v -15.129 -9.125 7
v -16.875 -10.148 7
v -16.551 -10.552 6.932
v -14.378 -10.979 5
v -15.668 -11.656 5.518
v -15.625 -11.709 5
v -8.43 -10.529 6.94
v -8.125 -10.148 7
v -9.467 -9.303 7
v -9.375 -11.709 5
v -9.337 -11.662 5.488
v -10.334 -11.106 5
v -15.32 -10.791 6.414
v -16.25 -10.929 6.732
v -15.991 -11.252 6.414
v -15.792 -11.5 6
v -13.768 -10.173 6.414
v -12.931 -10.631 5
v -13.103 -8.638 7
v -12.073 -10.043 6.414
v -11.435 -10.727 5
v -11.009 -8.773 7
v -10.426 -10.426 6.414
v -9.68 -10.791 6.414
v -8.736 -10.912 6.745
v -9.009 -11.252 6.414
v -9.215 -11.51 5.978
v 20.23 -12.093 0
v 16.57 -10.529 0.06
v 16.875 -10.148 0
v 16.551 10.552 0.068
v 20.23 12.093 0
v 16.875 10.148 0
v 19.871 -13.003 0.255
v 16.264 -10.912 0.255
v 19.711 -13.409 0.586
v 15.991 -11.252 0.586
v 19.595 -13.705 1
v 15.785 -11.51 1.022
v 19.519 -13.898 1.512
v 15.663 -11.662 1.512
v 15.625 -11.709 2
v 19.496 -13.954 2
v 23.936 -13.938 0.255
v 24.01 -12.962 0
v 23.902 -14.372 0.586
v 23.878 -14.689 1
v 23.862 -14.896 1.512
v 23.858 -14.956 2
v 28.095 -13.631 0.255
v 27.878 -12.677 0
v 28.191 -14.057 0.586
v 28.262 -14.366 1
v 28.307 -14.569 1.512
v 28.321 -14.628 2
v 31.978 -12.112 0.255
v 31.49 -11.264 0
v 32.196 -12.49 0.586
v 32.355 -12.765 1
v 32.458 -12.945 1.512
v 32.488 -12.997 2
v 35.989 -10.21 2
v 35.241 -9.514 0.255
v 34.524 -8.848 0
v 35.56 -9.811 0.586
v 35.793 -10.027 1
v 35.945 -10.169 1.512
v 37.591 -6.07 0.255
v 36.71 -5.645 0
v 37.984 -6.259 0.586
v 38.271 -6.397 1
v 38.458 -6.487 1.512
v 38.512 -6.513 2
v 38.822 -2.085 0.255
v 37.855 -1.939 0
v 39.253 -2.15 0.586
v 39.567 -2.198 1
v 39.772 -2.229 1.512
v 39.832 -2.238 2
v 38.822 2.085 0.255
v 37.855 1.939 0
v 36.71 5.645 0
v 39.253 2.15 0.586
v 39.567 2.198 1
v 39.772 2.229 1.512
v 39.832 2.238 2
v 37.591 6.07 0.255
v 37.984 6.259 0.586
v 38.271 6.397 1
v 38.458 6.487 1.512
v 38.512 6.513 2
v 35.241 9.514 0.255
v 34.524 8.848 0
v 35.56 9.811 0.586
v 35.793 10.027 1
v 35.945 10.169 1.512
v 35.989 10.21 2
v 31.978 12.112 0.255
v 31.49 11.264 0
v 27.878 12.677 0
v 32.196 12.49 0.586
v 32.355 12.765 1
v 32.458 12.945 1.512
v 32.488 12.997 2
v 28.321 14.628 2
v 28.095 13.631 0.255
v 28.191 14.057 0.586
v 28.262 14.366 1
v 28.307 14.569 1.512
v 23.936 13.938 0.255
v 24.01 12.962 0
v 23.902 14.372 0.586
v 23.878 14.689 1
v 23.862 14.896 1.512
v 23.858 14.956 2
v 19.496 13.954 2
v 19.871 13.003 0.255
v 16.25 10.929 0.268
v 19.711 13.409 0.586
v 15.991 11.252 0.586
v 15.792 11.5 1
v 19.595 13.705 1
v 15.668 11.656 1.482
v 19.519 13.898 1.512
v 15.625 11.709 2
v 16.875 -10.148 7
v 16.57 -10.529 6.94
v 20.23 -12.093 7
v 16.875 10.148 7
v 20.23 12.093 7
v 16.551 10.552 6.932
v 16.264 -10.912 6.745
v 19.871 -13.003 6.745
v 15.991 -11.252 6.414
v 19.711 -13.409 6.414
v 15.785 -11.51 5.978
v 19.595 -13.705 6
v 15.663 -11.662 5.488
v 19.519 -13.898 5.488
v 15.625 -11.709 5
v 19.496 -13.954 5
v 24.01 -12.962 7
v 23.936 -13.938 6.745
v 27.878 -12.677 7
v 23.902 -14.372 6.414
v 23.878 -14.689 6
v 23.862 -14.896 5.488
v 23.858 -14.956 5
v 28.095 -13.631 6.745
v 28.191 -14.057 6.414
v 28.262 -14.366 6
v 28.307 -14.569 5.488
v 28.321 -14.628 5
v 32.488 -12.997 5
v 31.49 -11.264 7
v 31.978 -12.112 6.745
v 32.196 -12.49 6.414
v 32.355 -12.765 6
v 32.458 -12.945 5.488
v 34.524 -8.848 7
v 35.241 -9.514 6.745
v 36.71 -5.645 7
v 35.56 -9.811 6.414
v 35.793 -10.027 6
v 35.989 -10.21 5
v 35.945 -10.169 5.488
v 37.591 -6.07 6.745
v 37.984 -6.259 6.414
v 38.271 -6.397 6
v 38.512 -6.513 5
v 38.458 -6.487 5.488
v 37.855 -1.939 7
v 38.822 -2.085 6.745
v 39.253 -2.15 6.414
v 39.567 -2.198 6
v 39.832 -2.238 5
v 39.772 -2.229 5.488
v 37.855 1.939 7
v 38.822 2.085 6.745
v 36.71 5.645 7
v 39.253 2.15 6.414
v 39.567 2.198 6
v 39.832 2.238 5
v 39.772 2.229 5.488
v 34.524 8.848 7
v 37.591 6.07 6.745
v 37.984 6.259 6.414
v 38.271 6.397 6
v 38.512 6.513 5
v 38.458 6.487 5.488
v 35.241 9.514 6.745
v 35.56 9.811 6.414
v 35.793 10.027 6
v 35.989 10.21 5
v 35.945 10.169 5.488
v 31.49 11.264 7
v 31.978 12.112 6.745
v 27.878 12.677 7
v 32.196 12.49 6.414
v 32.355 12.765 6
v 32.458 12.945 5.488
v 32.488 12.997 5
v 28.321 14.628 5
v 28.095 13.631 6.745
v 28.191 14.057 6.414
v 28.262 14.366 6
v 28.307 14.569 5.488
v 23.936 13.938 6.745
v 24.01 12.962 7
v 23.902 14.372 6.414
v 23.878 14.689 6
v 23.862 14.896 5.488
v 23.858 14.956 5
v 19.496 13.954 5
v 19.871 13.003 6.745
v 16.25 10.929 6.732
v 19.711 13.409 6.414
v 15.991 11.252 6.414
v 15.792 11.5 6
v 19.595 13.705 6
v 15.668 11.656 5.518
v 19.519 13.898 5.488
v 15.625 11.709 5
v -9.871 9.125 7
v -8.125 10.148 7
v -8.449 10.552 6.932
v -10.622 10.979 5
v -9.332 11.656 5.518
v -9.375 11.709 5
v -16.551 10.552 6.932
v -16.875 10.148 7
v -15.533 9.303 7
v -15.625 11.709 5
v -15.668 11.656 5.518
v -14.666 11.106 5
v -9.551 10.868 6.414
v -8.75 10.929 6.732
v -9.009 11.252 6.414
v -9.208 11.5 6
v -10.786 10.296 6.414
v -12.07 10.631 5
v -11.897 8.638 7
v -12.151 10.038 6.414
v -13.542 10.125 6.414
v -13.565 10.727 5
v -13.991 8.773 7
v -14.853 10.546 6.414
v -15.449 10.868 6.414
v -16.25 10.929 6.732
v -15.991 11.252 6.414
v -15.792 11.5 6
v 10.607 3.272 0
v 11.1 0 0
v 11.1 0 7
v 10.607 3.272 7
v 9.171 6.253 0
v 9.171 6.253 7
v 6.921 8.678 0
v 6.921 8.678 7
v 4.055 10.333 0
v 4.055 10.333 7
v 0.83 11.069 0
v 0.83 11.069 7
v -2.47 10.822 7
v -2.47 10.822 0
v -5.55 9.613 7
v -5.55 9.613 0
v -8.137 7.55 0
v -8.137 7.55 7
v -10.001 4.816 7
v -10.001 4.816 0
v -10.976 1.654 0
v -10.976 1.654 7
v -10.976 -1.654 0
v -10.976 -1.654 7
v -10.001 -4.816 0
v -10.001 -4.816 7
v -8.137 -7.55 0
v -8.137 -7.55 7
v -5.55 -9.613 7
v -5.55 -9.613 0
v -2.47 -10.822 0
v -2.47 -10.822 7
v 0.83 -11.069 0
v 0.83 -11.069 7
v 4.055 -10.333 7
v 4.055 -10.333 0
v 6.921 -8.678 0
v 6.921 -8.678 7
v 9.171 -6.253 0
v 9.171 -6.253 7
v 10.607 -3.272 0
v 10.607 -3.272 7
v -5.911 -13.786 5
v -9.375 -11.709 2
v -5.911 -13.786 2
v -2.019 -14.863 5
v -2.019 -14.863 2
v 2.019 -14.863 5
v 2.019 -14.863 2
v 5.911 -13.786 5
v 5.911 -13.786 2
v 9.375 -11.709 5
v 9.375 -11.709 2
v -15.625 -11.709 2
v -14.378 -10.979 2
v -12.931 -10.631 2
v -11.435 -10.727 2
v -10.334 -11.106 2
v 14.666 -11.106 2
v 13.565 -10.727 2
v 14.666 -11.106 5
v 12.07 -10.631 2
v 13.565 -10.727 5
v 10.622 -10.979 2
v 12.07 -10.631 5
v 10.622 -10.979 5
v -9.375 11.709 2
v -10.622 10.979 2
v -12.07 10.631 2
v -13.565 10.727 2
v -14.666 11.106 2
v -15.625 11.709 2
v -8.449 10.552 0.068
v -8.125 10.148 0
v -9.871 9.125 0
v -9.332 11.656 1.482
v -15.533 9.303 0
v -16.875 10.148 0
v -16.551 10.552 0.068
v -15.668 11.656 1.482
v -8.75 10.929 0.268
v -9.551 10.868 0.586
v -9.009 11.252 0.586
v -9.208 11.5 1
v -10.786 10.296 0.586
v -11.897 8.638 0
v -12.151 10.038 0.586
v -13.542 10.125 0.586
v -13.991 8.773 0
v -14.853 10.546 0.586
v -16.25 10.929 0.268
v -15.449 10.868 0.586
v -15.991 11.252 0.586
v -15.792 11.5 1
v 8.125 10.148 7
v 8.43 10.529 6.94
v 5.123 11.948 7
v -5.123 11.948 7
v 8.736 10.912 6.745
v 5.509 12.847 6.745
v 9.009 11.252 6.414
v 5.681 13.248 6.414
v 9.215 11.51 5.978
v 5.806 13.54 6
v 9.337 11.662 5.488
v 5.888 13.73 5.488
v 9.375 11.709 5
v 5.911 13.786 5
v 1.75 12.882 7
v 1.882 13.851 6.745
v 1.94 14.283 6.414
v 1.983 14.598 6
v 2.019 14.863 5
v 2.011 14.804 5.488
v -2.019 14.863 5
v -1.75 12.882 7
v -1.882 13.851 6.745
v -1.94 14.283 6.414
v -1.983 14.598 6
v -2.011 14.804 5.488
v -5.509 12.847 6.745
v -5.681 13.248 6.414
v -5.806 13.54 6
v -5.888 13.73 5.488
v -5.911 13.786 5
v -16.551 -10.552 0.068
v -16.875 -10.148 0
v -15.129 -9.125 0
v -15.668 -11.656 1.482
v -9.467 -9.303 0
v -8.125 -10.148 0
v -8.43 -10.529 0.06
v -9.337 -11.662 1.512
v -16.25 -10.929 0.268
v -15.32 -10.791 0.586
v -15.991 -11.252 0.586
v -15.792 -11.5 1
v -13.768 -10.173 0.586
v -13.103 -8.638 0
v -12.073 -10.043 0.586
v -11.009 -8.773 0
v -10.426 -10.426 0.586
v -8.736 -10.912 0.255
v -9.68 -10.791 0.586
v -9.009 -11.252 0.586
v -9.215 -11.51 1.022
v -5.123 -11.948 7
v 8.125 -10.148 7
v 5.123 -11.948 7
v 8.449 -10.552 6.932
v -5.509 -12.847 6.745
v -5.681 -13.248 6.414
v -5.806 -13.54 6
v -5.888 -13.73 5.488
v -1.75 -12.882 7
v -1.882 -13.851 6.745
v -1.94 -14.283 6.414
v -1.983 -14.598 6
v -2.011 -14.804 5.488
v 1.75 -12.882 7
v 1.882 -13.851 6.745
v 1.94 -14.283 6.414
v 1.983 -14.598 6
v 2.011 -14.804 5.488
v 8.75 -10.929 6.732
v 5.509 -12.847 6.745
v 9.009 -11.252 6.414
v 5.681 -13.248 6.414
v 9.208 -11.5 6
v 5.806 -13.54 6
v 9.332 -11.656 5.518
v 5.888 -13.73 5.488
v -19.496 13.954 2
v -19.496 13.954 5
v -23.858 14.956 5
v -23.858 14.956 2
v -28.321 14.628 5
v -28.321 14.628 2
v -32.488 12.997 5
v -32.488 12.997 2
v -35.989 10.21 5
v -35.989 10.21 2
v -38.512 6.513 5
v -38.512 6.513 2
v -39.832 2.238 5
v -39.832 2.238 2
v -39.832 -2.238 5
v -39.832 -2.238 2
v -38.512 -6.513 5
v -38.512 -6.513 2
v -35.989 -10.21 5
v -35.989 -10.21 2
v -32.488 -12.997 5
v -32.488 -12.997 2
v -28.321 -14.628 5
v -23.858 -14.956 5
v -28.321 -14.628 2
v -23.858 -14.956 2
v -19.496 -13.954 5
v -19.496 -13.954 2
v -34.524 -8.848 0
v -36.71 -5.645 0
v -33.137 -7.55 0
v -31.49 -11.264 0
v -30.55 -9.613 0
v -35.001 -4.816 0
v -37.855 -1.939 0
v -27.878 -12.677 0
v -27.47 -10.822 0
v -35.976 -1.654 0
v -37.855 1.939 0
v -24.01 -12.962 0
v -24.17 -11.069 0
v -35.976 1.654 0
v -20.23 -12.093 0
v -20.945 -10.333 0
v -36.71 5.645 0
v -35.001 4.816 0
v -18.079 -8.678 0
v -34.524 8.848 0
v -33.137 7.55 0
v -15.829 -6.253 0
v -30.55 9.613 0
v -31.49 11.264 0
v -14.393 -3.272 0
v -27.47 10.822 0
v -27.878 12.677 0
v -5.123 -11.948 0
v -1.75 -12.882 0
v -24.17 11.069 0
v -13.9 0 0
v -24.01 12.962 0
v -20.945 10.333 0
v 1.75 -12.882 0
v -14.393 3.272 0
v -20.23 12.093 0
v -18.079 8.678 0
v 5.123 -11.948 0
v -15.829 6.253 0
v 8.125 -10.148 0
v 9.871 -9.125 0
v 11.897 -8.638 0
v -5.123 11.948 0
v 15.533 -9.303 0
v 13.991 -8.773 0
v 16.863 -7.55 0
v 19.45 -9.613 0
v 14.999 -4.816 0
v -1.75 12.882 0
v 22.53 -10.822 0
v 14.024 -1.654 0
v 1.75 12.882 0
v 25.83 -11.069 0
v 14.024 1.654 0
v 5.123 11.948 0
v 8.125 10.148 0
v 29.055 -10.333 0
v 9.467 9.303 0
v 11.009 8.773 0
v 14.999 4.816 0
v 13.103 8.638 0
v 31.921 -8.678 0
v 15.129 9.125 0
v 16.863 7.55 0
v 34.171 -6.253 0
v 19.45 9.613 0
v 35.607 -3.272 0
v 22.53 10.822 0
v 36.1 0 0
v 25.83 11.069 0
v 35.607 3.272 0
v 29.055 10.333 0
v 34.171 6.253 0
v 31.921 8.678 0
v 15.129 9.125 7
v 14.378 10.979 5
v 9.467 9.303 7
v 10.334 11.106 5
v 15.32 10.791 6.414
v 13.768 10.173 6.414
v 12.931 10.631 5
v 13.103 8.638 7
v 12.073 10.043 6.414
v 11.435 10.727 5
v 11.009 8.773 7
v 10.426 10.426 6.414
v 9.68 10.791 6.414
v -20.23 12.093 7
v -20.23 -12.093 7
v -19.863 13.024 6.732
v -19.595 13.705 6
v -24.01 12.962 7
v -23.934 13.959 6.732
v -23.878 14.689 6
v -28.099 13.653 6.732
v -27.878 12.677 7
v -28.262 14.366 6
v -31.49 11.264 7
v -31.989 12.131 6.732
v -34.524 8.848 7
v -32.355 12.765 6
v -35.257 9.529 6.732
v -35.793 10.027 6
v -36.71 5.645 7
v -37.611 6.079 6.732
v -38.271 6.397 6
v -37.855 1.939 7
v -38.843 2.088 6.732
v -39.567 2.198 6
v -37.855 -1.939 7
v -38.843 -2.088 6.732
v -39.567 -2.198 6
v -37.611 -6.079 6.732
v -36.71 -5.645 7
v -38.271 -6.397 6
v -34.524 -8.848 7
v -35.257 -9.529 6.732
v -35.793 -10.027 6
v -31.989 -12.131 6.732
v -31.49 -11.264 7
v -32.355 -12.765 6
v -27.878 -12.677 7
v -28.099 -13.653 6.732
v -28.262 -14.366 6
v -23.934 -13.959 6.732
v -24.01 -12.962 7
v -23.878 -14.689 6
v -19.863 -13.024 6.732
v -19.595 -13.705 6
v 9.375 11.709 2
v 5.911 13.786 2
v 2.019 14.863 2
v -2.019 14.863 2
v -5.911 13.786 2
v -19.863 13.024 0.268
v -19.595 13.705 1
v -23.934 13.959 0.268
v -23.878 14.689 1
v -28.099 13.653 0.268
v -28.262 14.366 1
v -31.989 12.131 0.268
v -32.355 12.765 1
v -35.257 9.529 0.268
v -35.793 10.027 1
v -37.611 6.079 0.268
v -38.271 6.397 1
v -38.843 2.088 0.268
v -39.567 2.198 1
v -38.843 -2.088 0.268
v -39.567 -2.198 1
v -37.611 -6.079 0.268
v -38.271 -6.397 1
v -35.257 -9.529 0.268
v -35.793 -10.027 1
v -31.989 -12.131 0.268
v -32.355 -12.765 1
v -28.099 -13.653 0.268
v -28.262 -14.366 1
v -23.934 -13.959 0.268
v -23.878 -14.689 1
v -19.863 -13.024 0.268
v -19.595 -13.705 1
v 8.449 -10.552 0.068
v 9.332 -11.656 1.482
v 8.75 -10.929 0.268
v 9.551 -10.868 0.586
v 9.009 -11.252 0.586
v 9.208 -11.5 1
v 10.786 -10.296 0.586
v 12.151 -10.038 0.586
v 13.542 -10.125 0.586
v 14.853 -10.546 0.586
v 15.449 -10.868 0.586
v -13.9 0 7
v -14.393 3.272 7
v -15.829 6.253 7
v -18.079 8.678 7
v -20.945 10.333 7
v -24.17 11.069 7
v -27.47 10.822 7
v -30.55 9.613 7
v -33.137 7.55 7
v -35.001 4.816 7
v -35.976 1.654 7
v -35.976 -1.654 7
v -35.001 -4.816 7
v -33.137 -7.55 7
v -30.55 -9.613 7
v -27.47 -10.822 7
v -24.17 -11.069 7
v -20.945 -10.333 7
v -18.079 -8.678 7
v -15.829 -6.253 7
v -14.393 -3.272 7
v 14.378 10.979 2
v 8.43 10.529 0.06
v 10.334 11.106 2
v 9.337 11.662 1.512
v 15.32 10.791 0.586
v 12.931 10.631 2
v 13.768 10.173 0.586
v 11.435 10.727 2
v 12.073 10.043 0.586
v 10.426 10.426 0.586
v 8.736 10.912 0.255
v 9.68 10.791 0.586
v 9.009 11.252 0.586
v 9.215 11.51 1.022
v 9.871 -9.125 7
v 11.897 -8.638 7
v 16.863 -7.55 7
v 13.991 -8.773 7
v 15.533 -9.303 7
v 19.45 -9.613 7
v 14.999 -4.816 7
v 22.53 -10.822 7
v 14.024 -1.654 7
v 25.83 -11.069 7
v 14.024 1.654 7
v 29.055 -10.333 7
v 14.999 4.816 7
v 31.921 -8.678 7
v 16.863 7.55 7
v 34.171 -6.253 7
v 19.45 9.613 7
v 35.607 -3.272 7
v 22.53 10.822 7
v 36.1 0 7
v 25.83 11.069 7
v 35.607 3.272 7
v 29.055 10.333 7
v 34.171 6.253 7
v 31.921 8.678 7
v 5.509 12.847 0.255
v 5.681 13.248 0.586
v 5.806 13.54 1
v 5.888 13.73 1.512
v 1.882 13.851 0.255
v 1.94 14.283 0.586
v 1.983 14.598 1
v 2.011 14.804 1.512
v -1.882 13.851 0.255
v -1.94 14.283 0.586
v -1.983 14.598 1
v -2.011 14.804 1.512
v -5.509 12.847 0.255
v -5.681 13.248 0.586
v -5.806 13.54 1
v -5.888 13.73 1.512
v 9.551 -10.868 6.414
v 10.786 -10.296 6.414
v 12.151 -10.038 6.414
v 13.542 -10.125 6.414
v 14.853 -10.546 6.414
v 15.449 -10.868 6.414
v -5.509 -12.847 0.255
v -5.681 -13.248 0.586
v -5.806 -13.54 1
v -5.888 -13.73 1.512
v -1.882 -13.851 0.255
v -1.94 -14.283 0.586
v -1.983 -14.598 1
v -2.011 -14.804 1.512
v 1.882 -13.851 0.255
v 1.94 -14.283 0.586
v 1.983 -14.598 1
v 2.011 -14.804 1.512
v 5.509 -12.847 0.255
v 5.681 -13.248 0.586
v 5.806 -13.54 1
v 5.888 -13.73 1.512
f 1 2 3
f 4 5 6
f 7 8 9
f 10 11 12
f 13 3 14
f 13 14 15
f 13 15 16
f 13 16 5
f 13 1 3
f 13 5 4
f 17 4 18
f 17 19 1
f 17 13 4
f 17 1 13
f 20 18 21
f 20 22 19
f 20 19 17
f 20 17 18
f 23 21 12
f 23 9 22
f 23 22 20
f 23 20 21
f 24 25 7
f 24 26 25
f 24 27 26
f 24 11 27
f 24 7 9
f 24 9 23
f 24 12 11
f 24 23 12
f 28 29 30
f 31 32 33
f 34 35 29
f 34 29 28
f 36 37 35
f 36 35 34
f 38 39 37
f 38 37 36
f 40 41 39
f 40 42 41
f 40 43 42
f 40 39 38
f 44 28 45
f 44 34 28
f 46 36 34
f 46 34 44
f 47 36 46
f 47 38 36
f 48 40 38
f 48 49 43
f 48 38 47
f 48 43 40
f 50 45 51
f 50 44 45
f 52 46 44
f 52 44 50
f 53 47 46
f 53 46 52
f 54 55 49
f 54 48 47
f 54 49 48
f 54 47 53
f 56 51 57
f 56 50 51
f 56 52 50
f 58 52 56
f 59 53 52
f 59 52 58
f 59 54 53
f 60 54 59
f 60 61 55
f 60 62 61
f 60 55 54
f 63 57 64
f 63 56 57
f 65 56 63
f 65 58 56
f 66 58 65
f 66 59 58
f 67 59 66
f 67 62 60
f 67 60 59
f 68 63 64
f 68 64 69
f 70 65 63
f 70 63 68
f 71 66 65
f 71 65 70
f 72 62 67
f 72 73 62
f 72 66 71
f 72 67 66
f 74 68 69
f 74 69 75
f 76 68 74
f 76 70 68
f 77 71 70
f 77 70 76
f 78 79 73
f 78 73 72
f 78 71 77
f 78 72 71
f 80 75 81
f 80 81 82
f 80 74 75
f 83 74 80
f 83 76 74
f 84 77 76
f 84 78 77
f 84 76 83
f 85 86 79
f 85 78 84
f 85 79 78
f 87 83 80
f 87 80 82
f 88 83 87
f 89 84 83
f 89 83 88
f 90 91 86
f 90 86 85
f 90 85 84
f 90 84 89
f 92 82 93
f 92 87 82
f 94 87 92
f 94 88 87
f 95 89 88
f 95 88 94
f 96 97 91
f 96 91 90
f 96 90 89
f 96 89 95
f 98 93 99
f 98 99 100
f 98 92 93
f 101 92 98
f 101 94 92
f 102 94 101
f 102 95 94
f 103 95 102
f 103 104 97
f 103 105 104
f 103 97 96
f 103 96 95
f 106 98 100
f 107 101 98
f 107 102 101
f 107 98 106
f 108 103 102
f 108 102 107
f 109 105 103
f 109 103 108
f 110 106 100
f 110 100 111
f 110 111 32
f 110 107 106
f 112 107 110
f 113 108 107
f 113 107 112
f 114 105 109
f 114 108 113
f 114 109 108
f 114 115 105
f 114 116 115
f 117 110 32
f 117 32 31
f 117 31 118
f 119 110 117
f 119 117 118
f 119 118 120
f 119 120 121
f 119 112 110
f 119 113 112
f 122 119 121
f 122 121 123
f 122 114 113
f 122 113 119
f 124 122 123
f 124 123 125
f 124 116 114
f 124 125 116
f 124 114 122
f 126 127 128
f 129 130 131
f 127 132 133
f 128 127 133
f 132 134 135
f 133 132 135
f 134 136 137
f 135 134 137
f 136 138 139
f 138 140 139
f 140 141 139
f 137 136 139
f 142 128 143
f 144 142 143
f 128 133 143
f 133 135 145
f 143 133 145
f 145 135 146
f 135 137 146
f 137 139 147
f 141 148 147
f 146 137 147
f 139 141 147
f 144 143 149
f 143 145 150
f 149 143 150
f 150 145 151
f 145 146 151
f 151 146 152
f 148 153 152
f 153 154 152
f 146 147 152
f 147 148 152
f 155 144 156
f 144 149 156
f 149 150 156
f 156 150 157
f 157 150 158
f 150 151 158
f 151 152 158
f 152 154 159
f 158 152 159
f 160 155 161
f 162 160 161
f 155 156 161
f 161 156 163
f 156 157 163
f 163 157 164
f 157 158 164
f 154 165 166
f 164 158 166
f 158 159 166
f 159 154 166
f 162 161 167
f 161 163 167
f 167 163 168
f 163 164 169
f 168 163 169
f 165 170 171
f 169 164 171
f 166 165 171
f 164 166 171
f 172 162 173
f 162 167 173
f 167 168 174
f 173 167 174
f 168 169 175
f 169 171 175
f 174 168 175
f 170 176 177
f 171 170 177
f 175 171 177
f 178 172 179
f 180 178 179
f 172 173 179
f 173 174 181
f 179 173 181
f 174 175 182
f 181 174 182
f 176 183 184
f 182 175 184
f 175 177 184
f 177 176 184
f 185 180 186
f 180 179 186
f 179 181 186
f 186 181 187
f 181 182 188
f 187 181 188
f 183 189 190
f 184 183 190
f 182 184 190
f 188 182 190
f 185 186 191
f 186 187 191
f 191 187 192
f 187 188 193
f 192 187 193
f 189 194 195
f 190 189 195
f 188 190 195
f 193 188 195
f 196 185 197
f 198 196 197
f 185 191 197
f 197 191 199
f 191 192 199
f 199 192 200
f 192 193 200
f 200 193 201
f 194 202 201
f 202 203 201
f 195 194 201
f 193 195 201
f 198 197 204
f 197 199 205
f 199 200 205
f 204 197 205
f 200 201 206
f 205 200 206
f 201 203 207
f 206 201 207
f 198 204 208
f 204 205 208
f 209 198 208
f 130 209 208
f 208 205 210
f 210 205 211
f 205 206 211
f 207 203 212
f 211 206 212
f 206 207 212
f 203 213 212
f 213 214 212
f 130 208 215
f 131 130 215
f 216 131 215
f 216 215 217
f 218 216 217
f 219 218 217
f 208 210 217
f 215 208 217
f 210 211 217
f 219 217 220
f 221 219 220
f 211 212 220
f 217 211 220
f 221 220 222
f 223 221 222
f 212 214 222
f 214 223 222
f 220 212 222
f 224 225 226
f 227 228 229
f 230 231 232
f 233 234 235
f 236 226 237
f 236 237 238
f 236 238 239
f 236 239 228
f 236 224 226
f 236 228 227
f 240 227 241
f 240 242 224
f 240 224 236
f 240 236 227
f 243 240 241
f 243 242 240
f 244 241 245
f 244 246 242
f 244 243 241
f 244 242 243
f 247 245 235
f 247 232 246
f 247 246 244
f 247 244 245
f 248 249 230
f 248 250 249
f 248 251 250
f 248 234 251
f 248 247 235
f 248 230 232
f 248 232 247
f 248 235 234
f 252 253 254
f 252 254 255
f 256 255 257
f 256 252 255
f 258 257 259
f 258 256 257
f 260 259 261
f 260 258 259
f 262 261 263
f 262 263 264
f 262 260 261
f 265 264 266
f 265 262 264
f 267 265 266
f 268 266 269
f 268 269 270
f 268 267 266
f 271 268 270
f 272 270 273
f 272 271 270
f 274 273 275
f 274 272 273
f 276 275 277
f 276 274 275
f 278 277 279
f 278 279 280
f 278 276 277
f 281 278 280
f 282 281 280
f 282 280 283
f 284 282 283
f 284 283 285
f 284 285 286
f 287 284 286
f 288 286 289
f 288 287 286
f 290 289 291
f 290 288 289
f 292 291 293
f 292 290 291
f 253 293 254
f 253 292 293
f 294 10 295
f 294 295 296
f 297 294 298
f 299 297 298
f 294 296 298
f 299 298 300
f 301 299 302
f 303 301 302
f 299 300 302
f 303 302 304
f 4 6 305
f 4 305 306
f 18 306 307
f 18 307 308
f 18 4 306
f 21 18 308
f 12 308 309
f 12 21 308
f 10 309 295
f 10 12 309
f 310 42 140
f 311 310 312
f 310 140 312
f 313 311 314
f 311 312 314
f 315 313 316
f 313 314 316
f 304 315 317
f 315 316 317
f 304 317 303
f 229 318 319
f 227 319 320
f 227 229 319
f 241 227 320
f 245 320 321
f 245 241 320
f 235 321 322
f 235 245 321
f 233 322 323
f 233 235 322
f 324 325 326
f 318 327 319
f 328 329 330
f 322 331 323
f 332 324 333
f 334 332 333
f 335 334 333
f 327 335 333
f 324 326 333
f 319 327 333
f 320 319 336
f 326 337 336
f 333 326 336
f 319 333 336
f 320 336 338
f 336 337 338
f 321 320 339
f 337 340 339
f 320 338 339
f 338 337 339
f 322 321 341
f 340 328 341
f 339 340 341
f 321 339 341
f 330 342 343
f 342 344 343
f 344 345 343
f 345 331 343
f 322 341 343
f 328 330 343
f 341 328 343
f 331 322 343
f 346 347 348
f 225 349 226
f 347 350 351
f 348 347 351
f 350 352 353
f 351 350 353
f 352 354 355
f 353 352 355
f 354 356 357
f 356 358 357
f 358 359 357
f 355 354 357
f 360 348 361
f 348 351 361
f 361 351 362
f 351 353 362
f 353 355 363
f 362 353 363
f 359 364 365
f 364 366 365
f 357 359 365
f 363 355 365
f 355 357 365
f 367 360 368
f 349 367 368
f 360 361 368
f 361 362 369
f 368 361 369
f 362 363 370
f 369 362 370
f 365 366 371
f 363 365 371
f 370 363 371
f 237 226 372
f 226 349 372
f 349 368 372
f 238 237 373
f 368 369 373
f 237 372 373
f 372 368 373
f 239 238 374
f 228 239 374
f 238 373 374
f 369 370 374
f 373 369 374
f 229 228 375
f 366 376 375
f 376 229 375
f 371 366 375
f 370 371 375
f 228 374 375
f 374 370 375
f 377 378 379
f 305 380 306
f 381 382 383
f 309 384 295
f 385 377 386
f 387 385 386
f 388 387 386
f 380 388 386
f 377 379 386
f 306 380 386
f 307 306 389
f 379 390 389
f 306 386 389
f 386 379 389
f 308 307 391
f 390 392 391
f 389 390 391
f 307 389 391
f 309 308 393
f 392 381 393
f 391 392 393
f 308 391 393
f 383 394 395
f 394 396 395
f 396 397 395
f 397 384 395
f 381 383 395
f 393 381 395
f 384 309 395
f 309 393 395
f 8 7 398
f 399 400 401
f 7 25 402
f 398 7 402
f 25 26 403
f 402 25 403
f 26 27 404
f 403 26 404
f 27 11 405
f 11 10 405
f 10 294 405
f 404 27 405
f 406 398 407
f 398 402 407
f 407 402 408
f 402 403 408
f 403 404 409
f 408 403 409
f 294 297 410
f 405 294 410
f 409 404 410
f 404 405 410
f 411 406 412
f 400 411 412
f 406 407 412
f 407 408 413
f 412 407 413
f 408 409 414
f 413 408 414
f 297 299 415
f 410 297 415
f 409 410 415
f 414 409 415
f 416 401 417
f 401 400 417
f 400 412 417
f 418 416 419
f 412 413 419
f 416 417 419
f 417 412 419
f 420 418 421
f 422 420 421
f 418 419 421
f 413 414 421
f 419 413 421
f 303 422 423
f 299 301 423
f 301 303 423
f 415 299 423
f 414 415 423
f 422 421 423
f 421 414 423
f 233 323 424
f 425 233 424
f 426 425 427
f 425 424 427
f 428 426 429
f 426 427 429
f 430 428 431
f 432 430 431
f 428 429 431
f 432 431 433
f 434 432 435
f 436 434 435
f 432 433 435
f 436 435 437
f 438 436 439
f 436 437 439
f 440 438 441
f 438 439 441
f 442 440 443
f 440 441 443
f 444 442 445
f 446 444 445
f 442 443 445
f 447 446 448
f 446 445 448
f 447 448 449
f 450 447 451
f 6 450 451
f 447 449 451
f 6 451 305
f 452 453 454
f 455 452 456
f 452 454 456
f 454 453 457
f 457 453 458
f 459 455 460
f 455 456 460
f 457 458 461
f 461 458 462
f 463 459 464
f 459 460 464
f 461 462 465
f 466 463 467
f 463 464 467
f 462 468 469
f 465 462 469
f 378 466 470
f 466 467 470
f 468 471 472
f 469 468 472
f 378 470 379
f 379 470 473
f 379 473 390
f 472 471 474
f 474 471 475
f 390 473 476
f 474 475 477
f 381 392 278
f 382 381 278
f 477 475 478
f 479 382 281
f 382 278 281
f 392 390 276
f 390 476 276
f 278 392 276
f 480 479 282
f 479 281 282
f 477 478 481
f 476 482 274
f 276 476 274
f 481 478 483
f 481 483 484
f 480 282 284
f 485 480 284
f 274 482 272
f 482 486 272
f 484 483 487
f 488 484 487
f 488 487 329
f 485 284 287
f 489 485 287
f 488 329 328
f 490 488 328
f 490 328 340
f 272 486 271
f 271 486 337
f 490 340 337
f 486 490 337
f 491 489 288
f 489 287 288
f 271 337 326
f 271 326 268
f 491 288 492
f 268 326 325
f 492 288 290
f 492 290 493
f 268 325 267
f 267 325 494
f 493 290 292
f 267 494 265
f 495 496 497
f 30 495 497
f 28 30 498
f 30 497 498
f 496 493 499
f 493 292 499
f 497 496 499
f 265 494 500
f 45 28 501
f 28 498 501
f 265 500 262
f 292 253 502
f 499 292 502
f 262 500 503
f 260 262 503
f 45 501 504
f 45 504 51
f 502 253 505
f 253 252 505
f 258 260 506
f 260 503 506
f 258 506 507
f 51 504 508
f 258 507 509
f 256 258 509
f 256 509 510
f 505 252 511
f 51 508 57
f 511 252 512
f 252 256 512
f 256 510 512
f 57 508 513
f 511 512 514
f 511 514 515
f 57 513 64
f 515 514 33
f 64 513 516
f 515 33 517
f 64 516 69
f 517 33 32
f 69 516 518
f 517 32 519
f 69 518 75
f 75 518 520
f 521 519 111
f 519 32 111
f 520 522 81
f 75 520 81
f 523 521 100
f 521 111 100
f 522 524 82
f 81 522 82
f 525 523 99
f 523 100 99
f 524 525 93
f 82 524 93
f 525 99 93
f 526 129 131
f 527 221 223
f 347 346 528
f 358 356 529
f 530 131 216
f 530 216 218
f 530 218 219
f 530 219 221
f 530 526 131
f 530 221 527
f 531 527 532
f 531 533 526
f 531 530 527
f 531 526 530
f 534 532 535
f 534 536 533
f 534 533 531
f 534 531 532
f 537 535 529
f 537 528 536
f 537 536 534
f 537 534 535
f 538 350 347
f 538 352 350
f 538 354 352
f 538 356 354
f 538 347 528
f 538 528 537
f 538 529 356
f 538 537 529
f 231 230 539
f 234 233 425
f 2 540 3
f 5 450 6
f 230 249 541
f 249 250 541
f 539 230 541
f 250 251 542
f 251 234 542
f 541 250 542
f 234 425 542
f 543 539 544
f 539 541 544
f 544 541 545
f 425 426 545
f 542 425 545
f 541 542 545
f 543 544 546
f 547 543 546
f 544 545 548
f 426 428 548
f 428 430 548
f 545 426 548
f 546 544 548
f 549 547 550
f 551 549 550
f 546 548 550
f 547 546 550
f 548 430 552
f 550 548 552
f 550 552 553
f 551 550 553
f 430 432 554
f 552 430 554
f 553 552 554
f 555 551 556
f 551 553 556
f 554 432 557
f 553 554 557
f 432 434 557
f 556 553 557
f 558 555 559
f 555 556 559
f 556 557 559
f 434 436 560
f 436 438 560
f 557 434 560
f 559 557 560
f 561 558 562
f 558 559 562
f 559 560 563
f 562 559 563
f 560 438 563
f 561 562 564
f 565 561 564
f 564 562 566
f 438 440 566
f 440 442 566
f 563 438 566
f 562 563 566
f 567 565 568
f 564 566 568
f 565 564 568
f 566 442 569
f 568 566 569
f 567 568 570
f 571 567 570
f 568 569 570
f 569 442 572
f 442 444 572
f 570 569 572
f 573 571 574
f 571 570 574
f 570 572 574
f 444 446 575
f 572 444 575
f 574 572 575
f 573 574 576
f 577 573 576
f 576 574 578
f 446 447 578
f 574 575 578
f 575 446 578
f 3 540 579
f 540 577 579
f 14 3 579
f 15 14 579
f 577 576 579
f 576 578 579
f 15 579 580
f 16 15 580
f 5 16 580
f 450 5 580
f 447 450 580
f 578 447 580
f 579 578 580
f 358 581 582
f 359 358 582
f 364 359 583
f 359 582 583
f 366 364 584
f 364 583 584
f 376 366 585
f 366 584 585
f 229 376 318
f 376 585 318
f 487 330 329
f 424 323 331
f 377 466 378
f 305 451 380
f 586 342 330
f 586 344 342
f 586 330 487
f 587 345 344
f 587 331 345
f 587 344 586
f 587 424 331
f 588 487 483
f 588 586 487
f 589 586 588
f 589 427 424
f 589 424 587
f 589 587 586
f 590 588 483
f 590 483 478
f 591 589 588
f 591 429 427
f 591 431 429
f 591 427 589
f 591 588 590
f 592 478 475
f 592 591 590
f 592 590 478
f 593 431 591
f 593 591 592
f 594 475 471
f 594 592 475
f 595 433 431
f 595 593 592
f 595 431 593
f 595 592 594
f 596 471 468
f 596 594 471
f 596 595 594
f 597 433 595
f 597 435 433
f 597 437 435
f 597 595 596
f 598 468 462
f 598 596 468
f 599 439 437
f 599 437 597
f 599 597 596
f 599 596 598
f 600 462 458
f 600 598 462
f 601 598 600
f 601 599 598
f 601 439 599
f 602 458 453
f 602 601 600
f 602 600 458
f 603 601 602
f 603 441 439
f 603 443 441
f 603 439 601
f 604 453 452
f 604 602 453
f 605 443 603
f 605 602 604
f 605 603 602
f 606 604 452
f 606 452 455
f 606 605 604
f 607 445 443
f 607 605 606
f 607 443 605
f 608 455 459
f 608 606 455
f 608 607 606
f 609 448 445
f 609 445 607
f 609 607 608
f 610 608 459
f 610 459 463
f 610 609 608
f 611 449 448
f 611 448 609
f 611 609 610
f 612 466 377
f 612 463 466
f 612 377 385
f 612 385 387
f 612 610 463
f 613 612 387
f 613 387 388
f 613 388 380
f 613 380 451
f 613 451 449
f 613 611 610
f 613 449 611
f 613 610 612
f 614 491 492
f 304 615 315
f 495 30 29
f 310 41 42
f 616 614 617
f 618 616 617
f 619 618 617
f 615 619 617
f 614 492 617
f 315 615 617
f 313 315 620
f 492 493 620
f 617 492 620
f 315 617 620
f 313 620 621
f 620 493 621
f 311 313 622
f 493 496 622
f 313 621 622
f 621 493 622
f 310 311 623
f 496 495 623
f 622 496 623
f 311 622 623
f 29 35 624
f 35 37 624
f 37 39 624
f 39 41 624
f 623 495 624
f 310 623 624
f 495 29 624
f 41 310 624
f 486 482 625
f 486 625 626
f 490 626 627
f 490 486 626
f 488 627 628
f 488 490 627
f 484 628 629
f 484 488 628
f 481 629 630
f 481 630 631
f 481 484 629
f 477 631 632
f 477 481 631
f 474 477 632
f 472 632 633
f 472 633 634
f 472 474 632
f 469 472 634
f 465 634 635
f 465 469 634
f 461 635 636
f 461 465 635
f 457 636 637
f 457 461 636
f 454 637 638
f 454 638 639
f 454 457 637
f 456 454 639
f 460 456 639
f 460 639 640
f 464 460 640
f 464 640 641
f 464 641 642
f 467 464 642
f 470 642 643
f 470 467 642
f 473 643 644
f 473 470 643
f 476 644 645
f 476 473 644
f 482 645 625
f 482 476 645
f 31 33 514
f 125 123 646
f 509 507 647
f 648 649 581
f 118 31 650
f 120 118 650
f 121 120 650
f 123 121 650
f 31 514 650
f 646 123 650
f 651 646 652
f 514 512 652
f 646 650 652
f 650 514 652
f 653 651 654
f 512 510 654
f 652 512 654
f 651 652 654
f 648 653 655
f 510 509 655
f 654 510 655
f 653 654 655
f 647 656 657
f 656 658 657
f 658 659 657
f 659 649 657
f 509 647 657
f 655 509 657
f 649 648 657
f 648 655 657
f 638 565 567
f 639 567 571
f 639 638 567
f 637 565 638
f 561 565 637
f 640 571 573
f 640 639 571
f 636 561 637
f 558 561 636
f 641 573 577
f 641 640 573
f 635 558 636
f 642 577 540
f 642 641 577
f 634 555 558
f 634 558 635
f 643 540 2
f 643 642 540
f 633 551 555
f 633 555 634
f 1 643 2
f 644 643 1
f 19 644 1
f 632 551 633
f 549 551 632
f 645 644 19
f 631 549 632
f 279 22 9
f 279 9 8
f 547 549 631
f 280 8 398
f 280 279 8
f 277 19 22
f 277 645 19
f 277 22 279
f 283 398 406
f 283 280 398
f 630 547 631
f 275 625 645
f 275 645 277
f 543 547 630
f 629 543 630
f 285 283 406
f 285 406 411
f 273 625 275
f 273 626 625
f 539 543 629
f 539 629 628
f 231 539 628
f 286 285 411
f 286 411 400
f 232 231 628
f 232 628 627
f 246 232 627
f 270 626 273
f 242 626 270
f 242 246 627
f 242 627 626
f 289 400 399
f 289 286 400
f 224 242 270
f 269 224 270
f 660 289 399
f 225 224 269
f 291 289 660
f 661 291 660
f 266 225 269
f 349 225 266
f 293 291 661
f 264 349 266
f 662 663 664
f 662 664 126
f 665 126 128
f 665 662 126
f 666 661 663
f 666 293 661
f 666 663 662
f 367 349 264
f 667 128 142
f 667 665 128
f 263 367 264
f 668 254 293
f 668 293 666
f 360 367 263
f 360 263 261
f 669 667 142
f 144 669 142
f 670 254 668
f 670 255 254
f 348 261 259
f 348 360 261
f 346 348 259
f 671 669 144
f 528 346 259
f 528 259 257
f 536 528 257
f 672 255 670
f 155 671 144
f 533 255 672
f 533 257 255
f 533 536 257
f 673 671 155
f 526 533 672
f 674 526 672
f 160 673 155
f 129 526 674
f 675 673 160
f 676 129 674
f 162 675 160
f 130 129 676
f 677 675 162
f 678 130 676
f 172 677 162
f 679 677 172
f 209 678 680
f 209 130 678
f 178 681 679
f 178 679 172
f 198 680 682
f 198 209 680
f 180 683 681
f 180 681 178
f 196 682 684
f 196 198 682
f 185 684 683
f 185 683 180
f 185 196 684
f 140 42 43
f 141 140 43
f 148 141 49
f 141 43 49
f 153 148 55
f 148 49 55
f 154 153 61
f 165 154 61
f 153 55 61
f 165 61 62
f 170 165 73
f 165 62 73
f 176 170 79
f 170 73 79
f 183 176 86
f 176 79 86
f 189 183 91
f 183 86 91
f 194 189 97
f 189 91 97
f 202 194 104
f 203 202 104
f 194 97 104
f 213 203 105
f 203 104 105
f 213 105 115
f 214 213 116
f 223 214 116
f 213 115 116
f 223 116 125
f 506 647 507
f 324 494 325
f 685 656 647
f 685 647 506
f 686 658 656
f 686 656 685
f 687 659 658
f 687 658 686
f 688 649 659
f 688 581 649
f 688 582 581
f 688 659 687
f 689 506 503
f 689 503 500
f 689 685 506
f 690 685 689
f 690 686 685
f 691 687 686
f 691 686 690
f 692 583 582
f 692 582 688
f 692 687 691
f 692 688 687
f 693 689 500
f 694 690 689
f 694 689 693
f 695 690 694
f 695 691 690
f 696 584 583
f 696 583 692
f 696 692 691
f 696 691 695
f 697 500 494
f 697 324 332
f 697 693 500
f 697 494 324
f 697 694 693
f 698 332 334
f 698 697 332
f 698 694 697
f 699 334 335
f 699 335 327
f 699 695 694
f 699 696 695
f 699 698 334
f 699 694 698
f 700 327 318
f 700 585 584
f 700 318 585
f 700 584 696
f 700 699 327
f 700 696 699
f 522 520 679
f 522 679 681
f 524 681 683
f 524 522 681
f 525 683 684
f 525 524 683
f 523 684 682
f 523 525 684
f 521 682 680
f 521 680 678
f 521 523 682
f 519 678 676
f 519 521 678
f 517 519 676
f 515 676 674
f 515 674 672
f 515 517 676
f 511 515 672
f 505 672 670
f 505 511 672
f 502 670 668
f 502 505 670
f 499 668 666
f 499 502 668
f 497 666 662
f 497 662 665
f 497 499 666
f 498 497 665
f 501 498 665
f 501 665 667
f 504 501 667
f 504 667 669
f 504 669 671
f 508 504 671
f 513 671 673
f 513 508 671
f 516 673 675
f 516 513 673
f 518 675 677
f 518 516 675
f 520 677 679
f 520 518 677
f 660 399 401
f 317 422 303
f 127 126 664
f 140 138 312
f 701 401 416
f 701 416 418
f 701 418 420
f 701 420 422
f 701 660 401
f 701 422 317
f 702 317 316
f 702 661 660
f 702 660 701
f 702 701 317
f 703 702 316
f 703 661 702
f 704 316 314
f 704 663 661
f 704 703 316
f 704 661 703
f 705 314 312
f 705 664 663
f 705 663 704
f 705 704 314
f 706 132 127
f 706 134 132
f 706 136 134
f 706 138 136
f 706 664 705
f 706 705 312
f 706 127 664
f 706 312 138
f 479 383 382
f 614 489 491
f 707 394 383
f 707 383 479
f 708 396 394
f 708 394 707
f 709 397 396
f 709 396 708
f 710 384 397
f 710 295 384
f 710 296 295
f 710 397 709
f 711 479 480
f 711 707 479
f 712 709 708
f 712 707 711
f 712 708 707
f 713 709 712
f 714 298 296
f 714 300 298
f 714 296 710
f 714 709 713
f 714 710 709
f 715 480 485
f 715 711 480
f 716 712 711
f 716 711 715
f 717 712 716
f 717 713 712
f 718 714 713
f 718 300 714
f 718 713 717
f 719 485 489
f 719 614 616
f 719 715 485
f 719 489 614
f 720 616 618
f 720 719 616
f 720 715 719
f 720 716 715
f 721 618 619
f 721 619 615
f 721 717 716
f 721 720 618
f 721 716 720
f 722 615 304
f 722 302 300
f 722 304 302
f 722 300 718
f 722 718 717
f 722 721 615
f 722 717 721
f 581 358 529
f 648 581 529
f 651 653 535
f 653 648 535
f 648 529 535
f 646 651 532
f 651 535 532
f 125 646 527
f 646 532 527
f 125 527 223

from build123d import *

# Parameters (mm, degrees)
F0_R     = 11.1
F1_DEPTH = 7
F2_R     = 5
F3_R     = 2


with BuildPart() as f1:
    # F0 (on Top) → F1 (new body)
    with BuildSketch(Plane.XY):
        with BuildLine():
            ThreePointArc((12.5, 8.291562), (0, 15), (-12.5, 8.291562))
            ThreePointArc((-12.5, 8.291562), (-40, 0), (-12.5, -8.291562))
            ThreePointArc((-12.5, -8.291562), (0, -15), (12.5, -8.291562))
            ThreePointArc((12.5, -8.291562), (40, 0), (12.5, 8.291562))
        make_face()
        with Locations((-25, 0)):
            Circle(F0_R, mode=Mode.SUBTRACT)
        Circle(F0_R, mode=Mode.SUBTRACT)
        with Locations((25, 0)):
            Circle(F0_R, mode=Mode.SUBTRACT)
    extrude(amount=F1_DEPTH)

    # F2
    f2_edges = [f1.edges().sort_by_distance(p)[0] for p in [
        (-12.5, -8.291562, 3.5),
        (12.5, -8.291562, 3.5),
        (12.5, 8.291562, 3.5),
        (-12.5, 8.291562, 3.5),
    ]]
    fillet(f2_edges, radius=F2_R)

    # F3
    f3_edges = [f1.edges().sort_by_distance(p)[0] for p in [
        (-40, 0, 7),
        (-40, 0, 0),
    ]]
    fillet(f3_edges, radius=F3_R)


solid = f1.part
